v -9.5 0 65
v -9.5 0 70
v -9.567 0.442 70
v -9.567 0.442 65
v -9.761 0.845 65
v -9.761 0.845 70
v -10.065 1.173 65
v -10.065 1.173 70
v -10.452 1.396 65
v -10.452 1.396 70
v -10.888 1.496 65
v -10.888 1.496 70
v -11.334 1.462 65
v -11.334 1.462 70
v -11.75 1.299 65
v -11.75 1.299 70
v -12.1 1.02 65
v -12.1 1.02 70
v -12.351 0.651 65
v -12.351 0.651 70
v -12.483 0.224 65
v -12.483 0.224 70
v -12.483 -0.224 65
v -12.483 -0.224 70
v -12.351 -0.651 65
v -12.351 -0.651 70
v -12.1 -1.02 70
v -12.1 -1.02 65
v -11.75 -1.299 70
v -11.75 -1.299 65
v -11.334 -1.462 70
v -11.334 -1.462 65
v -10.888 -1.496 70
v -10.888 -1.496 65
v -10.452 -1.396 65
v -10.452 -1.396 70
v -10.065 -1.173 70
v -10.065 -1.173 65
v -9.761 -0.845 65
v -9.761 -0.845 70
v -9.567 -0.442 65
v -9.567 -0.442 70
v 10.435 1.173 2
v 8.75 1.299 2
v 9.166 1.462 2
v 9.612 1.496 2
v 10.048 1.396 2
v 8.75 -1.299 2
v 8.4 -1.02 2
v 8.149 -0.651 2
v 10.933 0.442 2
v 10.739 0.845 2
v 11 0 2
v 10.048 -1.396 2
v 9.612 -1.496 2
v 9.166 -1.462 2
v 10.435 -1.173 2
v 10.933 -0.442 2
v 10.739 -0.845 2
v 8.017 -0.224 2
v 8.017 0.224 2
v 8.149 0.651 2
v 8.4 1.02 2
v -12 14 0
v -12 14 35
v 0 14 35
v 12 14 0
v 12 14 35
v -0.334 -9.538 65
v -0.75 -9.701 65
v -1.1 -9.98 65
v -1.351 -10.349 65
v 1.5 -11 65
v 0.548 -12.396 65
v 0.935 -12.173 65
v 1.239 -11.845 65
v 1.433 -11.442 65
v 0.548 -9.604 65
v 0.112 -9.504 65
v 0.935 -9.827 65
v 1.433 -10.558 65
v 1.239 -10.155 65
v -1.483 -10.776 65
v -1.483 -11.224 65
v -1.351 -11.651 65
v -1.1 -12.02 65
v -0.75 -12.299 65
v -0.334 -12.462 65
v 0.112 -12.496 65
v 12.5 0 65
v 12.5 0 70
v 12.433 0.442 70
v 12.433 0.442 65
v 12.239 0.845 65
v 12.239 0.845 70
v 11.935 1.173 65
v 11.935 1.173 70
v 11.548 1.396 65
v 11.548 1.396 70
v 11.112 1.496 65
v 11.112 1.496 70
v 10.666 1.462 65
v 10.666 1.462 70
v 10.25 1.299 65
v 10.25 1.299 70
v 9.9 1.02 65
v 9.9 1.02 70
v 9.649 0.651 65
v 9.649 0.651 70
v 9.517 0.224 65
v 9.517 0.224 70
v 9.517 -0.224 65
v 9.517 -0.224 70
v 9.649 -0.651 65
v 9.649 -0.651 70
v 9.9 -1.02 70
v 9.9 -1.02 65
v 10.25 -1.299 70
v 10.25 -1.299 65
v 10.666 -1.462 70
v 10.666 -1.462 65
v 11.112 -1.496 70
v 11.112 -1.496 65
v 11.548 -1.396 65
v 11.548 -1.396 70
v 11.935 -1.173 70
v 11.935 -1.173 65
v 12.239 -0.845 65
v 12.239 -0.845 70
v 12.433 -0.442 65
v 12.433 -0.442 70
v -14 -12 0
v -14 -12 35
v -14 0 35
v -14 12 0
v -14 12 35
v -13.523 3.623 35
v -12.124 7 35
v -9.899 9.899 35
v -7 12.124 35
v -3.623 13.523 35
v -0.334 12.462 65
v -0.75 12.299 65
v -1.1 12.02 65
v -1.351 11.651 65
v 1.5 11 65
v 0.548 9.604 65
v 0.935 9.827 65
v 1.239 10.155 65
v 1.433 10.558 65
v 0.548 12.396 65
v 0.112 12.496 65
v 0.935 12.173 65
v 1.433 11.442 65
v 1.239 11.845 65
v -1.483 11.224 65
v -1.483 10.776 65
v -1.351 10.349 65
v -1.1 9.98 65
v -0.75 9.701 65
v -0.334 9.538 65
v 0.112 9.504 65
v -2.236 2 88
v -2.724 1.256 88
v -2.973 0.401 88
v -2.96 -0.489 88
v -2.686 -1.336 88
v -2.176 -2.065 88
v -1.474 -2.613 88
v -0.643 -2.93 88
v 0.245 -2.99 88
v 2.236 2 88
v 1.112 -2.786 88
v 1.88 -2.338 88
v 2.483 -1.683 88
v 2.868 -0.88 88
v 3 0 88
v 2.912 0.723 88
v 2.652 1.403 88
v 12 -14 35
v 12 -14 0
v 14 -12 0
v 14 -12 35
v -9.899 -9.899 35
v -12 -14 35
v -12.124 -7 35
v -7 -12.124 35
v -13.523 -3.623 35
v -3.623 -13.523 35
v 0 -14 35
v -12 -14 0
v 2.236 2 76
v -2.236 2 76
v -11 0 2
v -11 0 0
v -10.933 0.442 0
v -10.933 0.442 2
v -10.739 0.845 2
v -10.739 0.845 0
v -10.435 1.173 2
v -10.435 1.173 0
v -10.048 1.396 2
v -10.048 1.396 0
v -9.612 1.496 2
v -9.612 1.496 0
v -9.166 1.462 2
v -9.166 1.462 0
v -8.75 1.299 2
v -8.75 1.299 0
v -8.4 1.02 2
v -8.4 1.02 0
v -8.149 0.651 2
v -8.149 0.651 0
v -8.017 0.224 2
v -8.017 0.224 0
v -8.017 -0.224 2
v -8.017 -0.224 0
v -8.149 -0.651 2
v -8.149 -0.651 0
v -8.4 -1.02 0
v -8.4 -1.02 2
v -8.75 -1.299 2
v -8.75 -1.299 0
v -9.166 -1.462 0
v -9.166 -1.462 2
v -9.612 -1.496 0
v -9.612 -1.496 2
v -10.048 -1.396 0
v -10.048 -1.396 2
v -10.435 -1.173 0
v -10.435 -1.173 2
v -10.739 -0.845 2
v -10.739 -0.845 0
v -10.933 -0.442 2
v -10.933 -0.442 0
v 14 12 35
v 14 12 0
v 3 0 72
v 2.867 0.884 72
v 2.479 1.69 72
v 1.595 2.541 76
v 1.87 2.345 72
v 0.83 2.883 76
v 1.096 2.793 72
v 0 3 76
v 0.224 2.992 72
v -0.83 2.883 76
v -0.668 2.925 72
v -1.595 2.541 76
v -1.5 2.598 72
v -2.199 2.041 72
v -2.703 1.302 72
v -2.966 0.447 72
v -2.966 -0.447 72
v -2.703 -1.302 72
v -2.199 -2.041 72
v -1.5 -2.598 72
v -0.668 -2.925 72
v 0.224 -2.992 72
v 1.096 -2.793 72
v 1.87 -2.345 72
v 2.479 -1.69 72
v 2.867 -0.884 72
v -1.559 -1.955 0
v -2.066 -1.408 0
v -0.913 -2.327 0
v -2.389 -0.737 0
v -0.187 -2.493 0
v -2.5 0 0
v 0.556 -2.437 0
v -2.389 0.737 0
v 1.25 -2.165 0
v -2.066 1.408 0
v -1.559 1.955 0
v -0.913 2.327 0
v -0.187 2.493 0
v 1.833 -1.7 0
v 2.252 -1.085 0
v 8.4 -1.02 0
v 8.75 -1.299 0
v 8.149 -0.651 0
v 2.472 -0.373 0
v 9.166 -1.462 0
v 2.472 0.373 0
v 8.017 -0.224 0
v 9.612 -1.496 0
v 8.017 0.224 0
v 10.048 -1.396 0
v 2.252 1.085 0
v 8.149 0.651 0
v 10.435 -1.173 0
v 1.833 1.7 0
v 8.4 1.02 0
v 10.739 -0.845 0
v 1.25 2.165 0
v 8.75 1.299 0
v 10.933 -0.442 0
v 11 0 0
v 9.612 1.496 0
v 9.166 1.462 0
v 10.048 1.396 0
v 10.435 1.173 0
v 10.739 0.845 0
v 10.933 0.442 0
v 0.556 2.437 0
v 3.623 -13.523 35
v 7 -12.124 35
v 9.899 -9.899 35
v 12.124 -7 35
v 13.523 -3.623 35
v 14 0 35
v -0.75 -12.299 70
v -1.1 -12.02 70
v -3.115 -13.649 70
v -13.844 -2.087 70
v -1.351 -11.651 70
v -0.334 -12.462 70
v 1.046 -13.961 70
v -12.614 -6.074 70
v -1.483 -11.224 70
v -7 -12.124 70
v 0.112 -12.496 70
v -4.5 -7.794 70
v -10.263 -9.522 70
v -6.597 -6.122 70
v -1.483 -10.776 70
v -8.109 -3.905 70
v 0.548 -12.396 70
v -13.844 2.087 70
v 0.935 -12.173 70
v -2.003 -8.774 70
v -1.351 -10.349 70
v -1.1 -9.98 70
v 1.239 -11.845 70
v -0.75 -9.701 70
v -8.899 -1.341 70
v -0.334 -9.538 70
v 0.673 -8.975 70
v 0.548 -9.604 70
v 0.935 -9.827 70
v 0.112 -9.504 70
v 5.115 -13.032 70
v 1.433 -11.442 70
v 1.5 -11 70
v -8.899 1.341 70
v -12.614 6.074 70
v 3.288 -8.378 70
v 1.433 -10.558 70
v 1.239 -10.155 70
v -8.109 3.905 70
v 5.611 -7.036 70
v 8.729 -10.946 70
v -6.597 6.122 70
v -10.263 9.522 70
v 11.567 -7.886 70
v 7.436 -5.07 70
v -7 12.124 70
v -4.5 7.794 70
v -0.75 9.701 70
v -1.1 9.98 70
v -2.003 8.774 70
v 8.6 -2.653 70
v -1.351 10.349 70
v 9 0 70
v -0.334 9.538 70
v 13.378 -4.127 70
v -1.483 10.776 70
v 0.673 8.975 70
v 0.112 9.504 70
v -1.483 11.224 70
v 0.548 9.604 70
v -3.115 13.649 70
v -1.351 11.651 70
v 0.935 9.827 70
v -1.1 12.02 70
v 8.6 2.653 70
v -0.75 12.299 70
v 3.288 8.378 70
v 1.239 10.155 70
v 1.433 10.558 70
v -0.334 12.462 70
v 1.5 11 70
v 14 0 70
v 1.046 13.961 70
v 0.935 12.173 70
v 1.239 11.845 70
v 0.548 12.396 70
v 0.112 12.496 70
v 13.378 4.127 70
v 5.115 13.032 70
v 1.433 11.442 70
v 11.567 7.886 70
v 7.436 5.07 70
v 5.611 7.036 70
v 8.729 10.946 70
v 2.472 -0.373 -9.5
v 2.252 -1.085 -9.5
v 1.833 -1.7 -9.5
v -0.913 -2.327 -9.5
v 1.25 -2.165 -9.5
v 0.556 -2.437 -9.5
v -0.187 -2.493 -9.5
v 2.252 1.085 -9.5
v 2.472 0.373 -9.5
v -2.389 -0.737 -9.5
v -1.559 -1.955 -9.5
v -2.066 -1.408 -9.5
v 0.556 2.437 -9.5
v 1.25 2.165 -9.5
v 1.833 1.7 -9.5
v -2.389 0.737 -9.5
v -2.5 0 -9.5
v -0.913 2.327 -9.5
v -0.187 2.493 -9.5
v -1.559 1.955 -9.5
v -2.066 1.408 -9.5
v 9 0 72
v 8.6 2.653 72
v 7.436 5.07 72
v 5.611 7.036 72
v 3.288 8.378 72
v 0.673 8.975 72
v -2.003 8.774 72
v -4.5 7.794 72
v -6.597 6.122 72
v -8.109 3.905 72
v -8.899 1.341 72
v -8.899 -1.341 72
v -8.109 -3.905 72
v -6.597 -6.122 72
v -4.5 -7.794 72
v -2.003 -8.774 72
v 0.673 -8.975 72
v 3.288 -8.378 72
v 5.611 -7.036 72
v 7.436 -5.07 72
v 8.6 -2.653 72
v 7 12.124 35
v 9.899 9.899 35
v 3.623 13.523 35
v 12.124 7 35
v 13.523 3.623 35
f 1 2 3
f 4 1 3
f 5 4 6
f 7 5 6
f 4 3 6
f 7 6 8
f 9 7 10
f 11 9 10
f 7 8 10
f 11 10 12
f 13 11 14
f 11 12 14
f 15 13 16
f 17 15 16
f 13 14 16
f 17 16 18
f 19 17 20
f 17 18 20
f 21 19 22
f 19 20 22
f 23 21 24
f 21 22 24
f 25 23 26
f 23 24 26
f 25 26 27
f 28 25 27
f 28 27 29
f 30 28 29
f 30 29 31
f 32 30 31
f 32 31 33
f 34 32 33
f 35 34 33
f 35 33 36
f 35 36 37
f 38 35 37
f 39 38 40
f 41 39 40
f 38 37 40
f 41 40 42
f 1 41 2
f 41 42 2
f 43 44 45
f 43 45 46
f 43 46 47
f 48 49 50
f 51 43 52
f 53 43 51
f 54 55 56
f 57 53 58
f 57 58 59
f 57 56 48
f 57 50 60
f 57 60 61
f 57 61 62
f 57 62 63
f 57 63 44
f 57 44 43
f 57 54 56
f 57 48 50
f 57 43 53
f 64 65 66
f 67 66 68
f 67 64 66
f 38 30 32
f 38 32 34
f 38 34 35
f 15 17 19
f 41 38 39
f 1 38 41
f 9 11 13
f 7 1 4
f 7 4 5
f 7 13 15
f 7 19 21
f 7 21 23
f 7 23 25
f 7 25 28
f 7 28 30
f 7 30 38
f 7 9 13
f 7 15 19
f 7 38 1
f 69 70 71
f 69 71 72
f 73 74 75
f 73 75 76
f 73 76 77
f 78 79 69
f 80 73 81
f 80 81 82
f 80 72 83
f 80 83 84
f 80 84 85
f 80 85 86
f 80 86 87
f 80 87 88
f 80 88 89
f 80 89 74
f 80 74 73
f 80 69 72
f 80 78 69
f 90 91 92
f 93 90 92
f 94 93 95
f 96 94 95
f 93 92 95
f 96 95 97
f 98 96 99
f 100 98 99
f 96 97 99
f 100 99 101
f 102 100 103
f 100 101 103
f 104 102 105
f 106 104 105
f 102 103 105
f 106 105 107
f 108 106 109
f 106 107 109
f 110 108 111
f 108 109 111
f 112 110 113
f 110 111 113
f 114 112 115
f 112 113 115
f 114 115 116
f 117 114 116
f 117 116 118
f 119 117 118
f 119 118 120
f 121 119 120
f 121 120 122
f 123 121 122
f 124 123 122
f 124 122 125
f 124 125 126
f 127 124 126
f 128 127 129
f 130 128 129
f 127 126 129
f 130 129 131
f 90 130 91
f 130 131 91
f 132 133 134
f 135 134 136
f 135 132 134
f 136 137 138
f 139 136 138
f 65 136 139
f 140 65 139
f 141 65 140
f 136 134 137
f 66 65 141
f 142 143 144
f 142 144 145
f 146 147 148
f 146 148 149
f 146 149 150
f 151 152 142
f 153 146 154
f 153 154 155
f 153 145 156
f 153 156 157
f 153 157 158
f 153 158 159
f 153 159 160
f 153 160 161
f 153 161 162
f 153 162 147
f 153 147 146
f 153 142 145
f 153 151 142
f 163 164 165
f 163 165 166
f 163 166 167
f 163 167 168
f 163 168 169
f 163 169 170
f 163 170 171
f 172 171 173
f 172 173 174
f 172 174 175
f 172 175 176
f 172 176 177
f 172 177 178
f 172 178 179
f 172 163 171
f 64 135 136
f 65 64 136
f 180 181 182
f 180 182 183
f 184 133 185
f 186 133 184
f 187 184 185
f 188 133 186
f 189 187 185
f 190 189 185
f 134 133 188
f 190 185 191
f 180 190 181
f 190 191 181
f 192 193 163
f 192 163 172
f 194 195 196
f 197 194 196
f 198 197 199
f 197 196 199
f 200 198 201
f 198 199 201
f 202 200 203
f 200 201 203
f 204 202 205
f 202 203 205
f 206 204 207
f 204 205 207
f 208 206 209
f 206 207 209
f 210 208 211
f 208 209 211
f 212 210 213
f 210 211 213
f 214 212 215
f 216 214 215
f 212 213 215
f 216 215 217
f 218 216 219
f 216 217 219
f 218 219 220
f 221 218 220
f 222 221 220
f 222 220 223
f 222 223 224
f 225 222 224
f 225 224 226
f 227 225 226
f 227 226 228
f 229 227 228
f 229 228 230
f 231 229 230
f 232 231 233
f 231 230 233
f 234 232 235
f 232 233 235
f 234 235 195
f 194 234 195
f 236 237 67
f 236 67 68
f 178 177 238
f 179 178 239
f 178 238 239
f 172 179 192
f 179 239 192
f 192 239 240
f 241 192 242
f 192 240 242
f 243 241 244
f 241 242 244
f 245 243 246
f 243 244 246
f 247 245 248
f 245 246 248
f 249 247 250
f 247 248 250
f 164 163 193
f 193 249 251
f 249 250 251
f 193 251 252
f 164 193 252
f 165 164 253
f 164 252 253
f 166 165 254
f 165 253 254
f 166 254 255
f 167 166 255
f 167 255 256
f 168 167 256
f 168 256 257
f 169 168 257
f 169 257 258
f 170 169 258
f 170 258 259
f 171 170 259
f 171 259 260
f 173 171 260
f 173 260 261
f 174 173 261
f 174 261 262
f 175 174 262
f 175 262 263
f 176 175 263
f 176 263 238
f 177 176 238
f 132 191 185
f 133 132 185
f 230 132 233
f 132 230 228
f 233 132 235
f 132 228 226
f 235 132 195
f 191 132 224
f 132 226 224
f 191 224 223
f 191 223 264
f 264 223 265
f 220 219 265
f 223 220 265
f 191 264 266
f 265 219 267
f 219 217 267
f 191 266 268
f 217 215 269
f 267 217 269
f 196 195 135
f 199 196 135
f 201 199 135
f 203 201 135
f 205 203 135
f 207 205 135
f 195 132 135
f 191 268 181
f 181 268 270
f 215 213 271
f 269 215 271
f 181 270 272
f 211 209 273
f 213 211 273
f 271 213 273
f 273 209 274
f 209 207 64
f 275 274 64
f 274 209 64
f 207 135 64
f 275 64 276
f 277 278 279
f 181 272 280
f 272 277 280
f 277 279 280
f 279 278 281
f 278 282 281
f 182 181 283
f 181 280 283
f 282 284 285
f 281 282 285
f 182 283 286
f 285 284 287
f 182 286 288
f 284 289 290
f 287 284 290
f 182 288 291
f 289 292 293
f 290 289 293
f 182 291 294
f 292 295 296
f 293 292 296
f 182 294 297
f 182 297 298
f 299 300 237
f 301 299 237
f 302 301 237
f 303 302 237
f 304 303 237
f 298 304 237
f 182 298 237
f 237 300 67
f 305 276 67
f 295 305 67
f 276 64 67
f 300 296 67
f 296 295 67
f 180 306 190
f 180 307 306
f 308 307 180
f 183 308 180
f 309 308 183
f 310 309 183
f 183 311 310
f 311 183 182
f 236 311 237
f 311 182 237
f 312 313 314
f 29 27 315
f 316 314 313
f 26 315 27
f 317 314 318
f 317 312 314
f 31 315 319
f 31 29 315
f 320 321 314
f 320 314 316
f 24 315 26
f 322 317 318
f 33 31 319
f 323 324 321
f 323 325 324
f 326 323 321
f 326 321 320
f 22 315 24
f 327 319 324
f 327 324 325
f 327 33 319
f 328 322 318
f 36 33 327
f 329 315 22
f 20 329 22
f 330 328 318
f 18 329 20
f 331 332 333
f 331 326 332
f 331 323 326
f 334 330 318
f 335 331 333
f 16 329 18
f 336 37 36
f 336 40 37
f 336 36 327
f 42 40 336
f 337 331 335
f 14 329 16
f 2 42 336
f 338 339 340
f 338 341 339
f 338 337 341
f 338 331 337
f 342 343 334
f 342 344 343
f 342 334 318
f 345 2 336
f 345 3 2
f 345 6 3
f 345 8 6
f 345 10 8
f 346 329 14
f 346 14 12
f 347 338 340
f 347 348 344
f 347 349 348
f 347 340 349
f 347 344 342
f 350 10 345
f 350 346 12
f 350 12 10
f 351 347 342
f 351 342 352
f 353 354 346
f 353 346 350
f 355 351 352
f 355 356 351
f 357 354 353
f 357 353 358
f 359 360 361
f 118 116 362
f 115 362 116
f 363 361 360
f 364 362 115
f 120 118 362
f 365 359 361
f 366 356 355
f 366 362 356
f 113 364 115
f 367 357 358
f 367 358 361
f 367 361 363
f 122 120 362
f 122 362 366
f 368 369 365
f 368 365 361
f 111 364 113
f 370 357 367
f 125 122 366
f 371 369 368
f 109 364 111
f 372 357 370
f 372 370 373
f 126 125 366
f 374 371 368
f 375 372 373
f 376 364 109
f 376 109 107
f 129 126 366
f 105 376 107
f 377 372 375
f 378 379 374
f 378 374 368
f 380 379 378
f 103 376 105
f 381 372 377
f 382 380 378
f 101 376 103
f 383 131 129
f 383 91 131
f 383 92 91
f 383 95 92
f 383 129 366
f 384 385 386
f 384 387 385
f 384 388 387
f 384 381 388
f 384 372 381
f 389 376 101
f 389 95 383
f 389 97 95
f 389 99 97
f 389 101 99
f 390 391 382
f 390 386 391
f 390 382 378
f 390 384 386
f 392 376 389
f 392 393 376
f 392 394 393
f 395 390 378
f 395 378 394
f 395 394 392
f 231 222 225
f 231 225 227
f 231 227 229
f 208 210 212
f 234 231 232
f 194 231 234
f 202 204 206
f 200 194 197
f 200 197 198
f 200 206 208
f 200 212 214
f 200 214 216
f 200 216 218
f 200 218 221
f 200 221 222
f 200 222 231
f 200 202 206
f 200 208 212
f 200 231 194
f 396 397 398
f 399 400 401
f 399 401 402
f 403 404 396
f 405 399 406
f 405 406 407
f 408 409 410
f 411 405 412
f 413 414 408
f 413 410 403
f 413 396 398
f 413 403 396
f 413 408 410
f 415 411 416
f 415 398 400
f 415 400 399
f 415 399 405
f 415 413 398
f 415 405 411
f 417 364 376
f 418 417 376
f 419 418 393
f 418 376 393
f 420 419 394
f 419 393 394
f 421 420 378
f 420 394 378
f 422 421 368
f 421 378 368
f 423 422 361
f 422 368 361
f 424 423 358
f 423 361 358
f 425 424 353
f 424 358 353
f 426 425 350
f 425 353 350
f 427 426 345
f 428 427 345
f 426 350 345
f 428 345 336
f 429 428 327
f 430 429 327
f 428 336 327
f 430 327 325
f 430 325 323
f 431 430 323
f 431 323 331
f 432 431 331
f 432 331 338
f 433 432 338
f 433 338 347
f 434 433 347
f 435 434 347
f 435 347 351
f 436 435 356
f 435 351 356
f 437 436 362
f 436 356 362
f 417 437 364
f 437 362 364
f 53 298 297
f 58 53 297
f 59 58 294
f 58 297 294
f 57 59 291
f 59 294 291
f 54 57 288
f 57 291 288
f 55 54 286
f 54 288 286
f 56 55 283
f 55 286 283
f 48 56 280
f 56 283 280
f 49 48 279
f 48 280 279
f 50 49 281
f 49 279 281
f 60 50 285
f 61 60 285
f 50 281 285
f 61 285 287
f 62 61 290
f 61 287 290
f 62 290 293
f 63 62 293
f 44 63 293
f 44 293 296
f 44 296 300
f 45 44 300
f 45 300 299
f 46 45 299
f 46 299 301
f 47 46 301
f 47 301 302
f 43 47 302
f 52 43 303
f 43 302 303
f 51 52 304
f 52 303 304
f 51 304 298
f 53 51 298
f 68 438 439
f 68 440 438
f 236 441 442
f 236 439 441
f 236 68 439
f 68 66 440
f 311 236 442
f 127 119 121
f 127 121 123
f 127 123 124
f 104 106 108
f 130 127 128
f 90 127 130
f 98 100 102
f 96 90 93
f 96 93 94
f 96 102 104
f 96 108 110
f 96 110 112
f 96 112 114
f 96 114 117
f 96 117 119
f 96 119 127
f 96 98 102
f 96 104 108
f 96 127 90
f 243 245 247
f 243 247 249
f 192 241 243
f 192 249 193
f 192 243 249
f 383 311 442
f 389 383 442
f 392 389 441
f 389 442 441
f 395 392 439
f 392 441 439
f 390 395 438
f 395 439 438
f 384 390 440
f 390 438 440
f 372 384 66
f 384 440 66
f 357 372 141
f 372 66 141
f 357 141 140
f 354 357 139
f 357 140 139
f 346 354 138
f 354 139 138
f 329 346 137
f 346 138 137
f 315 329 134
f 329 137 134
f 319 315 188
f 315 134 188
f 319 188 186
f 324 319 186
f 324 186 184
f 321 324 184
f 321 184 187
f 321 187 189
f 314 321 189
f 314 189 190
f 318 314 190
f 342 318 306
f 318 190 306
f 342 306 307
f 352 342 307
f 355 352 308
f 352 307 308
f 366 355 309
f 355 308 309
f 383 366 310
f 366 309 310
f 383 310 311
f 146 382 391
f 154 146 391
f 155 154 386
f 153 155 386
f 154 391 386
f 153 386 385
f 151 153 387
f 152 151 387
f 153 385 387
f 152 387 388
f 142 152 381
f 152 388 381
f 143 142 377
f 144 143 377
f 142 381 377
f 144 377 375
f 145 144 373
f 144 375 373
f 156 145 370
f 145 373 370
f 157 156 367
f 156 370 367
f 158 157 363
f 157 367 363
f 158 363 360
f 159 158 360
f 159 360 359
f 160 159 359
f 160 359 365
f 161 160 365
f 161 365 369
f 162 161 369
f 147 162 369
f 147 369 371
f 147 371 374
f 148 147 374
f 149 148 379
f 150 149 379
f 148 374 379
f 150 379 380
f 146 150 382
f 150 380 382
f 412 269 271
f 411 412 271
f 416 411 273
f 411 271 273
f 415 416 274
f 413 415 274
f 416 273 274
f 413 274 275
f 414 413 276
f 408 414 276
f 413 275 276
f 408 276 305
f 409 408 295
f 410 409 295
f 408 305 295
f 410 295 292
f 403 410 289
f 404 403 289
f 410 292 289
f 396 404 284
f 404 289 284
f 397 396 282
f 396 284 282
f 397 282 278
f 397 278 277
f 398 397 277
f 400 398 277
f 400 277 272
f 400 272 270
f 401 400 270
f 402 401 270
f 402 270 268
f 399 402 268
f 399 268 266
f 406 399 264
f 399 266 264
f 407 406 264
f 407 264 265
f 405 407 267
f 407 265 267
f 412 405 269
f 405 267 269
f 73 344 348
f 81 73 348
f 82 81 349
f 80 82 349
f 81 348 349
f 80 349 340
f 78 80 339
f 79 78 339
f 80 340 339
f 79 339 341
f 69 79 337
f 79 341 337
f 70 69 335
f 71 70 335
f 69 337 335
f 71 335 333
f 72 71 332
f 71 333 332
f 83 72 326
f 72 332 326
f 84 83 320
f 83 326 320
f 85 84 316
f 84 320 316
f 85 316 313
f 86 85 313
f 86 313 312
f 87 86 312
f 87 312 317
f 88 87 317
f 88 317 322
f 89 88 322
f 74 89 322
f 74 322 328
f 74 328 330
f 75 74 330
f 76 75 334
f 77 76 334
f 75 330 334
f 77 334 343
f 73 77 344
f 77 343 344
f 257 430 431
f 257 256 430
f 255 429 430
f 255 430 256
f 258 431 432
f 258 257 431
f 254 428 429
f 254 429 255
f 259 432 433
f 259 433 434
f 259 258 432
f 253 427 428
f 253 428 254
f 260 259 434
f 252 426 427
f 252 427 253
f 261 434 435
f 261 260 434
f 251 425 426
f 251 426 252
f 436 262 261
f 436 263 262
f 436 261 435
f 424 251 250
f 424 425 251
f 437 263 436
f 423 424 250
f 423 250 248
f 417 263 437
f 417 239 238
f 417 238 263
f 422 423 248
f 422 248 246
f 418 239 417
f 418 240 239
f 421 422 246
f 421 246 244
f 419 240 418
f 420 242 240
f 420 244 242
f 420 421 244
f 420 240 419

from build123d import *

# Parameters (mm, degrees)
SKETCH1_W           = 28
SKETCH1_H           = 28
BOSS_EXTRUDE1_DEPTH = 35
SKETCH2_R           = 14
BOSS_EXTRUDE2_DEPTH = 35
SKETCH3_R           = 9
BOSS_EXTRUDE3_DEPTH = 2
SKETCH4_R           = 3
BOSS_EXTRUDE4_DEPTH = 16
CUT_EXTRUDE1_START  = -12
CUT_EXTRUDE1_DEPTH  = 12
SKETCH6_R           = 1.5
CUT_EXTRUDE2_DEPTH  = 2
SKETCH7_R           = 2.5
BOSS_EXTRUDE5_DEPTH = 9.5
CHAMFER1_SIZE       = 2
SKETCH8_R           = 1.5
CUT_EXTRUDE3_DEPTH  = 5


with BuildPart() as part:
    # Sketch1 → Boss-Extrude1 (new body)
    with BuildSketch(Plane.XY):
        Rectangle(SKETCH1_W, SKETCH1_H)
    extrude(amount=BOSS_EXTRUDE1_DEPTH)

    # Sketch2 → Boss-Extrude2 (add)
    with BuildSketch(Plane.XY.offset(35)):
        Circle(SKETCH2_R)
    extrude(amount=BOSS_EXTRUDE2_DEPTH)

    # Sketch3 → Boss-Extrude3 (add)
    with BuildSketch(Plane.XY.offset(70)):
        Circle(SKETCH3_R)
    extrude(amount=BOSS_EXTRUDE3_DEPTH)

    # Sketch4 → Boss-Extrude4 (add)
    with BuildSketch(Plane.XY.offset(72)):
        Circle(SKETCH4_R)
    extrude(amount=BOSS_EXTRUDE4_DEPTH)

    # Sketch5 → Cut-Extrude1 (cut)
    with BuildSketch(Plane.XY.offset(88).offset(CUT_EXTRUDE1_START)):
        with BuildLine():
            Line((-2.236067977, 2), (2.236067977, 2))
            ThreePointArc((2.236067977, 2), (0, 3), (-2.236067977, 2))
        make_face()
    extrude(amount=CUT_EXTRUDE1_DEPTH, mode=Mode.SUBTRACT)

    # Sketch6 → Cut-Extrude2 (cut)
    with BuildSketch(Plane(origin=(0, 0, 0), x_dir=(-1, 0, 0), z_dir=(0, 0, -1))):
        with Locations((9.5, 0)):
            Circle(SKETCH6_R)
        with Locations(Location((-9.5, 0, 0), (0, 0, 180))):
            Circle(SKETCH6_R)
    extrude(amount=-CUT_EXTRUDE2_DEPTH, mode=Mode.SUBTRACT)

    # Sketch7 → Boss-Extrude5 (add)
    with BuildSketch(Plane(origin=(0, 0, 0), x_dir=(-1, 0, 0), z_dir=(0, 0, -1))):
        Circle(SKETCH7_R)
    extrude(amount=BOSS_EXTRUDE5_DEPTH)

    # Chamfer1
    chamfer1_edges = [part.edges().sort_by_distance(p)[0] for p in [
        (14, -14, 17.5),
        (-14, -14, 17.5),
        (-14, 14, 17.5),
        (14, 14, 17.5),
    ]]
    chamfer(chamfer1_edges, length=CHAMFER1_SIZE)

    # Sketch8 → Cut-Extrude3 (cut)
    with BuildSketch(Plane.XY.offset(70)):
        with Locations((0, 11)):
            Circle(SKETCH8_R)
        with Locations((11, 0)):
            Circle(SKETCH8_R)
        with Locations((0, -11)):
            Circle(SKETCH8_R)
        with Locations((-11, 0)):
            Circle(SKETCH8_R)
    extrude(amount=-CUT_EXTRUDE3_DEPTH, mode=Mode.SUBTRACT)


solid = part.part
